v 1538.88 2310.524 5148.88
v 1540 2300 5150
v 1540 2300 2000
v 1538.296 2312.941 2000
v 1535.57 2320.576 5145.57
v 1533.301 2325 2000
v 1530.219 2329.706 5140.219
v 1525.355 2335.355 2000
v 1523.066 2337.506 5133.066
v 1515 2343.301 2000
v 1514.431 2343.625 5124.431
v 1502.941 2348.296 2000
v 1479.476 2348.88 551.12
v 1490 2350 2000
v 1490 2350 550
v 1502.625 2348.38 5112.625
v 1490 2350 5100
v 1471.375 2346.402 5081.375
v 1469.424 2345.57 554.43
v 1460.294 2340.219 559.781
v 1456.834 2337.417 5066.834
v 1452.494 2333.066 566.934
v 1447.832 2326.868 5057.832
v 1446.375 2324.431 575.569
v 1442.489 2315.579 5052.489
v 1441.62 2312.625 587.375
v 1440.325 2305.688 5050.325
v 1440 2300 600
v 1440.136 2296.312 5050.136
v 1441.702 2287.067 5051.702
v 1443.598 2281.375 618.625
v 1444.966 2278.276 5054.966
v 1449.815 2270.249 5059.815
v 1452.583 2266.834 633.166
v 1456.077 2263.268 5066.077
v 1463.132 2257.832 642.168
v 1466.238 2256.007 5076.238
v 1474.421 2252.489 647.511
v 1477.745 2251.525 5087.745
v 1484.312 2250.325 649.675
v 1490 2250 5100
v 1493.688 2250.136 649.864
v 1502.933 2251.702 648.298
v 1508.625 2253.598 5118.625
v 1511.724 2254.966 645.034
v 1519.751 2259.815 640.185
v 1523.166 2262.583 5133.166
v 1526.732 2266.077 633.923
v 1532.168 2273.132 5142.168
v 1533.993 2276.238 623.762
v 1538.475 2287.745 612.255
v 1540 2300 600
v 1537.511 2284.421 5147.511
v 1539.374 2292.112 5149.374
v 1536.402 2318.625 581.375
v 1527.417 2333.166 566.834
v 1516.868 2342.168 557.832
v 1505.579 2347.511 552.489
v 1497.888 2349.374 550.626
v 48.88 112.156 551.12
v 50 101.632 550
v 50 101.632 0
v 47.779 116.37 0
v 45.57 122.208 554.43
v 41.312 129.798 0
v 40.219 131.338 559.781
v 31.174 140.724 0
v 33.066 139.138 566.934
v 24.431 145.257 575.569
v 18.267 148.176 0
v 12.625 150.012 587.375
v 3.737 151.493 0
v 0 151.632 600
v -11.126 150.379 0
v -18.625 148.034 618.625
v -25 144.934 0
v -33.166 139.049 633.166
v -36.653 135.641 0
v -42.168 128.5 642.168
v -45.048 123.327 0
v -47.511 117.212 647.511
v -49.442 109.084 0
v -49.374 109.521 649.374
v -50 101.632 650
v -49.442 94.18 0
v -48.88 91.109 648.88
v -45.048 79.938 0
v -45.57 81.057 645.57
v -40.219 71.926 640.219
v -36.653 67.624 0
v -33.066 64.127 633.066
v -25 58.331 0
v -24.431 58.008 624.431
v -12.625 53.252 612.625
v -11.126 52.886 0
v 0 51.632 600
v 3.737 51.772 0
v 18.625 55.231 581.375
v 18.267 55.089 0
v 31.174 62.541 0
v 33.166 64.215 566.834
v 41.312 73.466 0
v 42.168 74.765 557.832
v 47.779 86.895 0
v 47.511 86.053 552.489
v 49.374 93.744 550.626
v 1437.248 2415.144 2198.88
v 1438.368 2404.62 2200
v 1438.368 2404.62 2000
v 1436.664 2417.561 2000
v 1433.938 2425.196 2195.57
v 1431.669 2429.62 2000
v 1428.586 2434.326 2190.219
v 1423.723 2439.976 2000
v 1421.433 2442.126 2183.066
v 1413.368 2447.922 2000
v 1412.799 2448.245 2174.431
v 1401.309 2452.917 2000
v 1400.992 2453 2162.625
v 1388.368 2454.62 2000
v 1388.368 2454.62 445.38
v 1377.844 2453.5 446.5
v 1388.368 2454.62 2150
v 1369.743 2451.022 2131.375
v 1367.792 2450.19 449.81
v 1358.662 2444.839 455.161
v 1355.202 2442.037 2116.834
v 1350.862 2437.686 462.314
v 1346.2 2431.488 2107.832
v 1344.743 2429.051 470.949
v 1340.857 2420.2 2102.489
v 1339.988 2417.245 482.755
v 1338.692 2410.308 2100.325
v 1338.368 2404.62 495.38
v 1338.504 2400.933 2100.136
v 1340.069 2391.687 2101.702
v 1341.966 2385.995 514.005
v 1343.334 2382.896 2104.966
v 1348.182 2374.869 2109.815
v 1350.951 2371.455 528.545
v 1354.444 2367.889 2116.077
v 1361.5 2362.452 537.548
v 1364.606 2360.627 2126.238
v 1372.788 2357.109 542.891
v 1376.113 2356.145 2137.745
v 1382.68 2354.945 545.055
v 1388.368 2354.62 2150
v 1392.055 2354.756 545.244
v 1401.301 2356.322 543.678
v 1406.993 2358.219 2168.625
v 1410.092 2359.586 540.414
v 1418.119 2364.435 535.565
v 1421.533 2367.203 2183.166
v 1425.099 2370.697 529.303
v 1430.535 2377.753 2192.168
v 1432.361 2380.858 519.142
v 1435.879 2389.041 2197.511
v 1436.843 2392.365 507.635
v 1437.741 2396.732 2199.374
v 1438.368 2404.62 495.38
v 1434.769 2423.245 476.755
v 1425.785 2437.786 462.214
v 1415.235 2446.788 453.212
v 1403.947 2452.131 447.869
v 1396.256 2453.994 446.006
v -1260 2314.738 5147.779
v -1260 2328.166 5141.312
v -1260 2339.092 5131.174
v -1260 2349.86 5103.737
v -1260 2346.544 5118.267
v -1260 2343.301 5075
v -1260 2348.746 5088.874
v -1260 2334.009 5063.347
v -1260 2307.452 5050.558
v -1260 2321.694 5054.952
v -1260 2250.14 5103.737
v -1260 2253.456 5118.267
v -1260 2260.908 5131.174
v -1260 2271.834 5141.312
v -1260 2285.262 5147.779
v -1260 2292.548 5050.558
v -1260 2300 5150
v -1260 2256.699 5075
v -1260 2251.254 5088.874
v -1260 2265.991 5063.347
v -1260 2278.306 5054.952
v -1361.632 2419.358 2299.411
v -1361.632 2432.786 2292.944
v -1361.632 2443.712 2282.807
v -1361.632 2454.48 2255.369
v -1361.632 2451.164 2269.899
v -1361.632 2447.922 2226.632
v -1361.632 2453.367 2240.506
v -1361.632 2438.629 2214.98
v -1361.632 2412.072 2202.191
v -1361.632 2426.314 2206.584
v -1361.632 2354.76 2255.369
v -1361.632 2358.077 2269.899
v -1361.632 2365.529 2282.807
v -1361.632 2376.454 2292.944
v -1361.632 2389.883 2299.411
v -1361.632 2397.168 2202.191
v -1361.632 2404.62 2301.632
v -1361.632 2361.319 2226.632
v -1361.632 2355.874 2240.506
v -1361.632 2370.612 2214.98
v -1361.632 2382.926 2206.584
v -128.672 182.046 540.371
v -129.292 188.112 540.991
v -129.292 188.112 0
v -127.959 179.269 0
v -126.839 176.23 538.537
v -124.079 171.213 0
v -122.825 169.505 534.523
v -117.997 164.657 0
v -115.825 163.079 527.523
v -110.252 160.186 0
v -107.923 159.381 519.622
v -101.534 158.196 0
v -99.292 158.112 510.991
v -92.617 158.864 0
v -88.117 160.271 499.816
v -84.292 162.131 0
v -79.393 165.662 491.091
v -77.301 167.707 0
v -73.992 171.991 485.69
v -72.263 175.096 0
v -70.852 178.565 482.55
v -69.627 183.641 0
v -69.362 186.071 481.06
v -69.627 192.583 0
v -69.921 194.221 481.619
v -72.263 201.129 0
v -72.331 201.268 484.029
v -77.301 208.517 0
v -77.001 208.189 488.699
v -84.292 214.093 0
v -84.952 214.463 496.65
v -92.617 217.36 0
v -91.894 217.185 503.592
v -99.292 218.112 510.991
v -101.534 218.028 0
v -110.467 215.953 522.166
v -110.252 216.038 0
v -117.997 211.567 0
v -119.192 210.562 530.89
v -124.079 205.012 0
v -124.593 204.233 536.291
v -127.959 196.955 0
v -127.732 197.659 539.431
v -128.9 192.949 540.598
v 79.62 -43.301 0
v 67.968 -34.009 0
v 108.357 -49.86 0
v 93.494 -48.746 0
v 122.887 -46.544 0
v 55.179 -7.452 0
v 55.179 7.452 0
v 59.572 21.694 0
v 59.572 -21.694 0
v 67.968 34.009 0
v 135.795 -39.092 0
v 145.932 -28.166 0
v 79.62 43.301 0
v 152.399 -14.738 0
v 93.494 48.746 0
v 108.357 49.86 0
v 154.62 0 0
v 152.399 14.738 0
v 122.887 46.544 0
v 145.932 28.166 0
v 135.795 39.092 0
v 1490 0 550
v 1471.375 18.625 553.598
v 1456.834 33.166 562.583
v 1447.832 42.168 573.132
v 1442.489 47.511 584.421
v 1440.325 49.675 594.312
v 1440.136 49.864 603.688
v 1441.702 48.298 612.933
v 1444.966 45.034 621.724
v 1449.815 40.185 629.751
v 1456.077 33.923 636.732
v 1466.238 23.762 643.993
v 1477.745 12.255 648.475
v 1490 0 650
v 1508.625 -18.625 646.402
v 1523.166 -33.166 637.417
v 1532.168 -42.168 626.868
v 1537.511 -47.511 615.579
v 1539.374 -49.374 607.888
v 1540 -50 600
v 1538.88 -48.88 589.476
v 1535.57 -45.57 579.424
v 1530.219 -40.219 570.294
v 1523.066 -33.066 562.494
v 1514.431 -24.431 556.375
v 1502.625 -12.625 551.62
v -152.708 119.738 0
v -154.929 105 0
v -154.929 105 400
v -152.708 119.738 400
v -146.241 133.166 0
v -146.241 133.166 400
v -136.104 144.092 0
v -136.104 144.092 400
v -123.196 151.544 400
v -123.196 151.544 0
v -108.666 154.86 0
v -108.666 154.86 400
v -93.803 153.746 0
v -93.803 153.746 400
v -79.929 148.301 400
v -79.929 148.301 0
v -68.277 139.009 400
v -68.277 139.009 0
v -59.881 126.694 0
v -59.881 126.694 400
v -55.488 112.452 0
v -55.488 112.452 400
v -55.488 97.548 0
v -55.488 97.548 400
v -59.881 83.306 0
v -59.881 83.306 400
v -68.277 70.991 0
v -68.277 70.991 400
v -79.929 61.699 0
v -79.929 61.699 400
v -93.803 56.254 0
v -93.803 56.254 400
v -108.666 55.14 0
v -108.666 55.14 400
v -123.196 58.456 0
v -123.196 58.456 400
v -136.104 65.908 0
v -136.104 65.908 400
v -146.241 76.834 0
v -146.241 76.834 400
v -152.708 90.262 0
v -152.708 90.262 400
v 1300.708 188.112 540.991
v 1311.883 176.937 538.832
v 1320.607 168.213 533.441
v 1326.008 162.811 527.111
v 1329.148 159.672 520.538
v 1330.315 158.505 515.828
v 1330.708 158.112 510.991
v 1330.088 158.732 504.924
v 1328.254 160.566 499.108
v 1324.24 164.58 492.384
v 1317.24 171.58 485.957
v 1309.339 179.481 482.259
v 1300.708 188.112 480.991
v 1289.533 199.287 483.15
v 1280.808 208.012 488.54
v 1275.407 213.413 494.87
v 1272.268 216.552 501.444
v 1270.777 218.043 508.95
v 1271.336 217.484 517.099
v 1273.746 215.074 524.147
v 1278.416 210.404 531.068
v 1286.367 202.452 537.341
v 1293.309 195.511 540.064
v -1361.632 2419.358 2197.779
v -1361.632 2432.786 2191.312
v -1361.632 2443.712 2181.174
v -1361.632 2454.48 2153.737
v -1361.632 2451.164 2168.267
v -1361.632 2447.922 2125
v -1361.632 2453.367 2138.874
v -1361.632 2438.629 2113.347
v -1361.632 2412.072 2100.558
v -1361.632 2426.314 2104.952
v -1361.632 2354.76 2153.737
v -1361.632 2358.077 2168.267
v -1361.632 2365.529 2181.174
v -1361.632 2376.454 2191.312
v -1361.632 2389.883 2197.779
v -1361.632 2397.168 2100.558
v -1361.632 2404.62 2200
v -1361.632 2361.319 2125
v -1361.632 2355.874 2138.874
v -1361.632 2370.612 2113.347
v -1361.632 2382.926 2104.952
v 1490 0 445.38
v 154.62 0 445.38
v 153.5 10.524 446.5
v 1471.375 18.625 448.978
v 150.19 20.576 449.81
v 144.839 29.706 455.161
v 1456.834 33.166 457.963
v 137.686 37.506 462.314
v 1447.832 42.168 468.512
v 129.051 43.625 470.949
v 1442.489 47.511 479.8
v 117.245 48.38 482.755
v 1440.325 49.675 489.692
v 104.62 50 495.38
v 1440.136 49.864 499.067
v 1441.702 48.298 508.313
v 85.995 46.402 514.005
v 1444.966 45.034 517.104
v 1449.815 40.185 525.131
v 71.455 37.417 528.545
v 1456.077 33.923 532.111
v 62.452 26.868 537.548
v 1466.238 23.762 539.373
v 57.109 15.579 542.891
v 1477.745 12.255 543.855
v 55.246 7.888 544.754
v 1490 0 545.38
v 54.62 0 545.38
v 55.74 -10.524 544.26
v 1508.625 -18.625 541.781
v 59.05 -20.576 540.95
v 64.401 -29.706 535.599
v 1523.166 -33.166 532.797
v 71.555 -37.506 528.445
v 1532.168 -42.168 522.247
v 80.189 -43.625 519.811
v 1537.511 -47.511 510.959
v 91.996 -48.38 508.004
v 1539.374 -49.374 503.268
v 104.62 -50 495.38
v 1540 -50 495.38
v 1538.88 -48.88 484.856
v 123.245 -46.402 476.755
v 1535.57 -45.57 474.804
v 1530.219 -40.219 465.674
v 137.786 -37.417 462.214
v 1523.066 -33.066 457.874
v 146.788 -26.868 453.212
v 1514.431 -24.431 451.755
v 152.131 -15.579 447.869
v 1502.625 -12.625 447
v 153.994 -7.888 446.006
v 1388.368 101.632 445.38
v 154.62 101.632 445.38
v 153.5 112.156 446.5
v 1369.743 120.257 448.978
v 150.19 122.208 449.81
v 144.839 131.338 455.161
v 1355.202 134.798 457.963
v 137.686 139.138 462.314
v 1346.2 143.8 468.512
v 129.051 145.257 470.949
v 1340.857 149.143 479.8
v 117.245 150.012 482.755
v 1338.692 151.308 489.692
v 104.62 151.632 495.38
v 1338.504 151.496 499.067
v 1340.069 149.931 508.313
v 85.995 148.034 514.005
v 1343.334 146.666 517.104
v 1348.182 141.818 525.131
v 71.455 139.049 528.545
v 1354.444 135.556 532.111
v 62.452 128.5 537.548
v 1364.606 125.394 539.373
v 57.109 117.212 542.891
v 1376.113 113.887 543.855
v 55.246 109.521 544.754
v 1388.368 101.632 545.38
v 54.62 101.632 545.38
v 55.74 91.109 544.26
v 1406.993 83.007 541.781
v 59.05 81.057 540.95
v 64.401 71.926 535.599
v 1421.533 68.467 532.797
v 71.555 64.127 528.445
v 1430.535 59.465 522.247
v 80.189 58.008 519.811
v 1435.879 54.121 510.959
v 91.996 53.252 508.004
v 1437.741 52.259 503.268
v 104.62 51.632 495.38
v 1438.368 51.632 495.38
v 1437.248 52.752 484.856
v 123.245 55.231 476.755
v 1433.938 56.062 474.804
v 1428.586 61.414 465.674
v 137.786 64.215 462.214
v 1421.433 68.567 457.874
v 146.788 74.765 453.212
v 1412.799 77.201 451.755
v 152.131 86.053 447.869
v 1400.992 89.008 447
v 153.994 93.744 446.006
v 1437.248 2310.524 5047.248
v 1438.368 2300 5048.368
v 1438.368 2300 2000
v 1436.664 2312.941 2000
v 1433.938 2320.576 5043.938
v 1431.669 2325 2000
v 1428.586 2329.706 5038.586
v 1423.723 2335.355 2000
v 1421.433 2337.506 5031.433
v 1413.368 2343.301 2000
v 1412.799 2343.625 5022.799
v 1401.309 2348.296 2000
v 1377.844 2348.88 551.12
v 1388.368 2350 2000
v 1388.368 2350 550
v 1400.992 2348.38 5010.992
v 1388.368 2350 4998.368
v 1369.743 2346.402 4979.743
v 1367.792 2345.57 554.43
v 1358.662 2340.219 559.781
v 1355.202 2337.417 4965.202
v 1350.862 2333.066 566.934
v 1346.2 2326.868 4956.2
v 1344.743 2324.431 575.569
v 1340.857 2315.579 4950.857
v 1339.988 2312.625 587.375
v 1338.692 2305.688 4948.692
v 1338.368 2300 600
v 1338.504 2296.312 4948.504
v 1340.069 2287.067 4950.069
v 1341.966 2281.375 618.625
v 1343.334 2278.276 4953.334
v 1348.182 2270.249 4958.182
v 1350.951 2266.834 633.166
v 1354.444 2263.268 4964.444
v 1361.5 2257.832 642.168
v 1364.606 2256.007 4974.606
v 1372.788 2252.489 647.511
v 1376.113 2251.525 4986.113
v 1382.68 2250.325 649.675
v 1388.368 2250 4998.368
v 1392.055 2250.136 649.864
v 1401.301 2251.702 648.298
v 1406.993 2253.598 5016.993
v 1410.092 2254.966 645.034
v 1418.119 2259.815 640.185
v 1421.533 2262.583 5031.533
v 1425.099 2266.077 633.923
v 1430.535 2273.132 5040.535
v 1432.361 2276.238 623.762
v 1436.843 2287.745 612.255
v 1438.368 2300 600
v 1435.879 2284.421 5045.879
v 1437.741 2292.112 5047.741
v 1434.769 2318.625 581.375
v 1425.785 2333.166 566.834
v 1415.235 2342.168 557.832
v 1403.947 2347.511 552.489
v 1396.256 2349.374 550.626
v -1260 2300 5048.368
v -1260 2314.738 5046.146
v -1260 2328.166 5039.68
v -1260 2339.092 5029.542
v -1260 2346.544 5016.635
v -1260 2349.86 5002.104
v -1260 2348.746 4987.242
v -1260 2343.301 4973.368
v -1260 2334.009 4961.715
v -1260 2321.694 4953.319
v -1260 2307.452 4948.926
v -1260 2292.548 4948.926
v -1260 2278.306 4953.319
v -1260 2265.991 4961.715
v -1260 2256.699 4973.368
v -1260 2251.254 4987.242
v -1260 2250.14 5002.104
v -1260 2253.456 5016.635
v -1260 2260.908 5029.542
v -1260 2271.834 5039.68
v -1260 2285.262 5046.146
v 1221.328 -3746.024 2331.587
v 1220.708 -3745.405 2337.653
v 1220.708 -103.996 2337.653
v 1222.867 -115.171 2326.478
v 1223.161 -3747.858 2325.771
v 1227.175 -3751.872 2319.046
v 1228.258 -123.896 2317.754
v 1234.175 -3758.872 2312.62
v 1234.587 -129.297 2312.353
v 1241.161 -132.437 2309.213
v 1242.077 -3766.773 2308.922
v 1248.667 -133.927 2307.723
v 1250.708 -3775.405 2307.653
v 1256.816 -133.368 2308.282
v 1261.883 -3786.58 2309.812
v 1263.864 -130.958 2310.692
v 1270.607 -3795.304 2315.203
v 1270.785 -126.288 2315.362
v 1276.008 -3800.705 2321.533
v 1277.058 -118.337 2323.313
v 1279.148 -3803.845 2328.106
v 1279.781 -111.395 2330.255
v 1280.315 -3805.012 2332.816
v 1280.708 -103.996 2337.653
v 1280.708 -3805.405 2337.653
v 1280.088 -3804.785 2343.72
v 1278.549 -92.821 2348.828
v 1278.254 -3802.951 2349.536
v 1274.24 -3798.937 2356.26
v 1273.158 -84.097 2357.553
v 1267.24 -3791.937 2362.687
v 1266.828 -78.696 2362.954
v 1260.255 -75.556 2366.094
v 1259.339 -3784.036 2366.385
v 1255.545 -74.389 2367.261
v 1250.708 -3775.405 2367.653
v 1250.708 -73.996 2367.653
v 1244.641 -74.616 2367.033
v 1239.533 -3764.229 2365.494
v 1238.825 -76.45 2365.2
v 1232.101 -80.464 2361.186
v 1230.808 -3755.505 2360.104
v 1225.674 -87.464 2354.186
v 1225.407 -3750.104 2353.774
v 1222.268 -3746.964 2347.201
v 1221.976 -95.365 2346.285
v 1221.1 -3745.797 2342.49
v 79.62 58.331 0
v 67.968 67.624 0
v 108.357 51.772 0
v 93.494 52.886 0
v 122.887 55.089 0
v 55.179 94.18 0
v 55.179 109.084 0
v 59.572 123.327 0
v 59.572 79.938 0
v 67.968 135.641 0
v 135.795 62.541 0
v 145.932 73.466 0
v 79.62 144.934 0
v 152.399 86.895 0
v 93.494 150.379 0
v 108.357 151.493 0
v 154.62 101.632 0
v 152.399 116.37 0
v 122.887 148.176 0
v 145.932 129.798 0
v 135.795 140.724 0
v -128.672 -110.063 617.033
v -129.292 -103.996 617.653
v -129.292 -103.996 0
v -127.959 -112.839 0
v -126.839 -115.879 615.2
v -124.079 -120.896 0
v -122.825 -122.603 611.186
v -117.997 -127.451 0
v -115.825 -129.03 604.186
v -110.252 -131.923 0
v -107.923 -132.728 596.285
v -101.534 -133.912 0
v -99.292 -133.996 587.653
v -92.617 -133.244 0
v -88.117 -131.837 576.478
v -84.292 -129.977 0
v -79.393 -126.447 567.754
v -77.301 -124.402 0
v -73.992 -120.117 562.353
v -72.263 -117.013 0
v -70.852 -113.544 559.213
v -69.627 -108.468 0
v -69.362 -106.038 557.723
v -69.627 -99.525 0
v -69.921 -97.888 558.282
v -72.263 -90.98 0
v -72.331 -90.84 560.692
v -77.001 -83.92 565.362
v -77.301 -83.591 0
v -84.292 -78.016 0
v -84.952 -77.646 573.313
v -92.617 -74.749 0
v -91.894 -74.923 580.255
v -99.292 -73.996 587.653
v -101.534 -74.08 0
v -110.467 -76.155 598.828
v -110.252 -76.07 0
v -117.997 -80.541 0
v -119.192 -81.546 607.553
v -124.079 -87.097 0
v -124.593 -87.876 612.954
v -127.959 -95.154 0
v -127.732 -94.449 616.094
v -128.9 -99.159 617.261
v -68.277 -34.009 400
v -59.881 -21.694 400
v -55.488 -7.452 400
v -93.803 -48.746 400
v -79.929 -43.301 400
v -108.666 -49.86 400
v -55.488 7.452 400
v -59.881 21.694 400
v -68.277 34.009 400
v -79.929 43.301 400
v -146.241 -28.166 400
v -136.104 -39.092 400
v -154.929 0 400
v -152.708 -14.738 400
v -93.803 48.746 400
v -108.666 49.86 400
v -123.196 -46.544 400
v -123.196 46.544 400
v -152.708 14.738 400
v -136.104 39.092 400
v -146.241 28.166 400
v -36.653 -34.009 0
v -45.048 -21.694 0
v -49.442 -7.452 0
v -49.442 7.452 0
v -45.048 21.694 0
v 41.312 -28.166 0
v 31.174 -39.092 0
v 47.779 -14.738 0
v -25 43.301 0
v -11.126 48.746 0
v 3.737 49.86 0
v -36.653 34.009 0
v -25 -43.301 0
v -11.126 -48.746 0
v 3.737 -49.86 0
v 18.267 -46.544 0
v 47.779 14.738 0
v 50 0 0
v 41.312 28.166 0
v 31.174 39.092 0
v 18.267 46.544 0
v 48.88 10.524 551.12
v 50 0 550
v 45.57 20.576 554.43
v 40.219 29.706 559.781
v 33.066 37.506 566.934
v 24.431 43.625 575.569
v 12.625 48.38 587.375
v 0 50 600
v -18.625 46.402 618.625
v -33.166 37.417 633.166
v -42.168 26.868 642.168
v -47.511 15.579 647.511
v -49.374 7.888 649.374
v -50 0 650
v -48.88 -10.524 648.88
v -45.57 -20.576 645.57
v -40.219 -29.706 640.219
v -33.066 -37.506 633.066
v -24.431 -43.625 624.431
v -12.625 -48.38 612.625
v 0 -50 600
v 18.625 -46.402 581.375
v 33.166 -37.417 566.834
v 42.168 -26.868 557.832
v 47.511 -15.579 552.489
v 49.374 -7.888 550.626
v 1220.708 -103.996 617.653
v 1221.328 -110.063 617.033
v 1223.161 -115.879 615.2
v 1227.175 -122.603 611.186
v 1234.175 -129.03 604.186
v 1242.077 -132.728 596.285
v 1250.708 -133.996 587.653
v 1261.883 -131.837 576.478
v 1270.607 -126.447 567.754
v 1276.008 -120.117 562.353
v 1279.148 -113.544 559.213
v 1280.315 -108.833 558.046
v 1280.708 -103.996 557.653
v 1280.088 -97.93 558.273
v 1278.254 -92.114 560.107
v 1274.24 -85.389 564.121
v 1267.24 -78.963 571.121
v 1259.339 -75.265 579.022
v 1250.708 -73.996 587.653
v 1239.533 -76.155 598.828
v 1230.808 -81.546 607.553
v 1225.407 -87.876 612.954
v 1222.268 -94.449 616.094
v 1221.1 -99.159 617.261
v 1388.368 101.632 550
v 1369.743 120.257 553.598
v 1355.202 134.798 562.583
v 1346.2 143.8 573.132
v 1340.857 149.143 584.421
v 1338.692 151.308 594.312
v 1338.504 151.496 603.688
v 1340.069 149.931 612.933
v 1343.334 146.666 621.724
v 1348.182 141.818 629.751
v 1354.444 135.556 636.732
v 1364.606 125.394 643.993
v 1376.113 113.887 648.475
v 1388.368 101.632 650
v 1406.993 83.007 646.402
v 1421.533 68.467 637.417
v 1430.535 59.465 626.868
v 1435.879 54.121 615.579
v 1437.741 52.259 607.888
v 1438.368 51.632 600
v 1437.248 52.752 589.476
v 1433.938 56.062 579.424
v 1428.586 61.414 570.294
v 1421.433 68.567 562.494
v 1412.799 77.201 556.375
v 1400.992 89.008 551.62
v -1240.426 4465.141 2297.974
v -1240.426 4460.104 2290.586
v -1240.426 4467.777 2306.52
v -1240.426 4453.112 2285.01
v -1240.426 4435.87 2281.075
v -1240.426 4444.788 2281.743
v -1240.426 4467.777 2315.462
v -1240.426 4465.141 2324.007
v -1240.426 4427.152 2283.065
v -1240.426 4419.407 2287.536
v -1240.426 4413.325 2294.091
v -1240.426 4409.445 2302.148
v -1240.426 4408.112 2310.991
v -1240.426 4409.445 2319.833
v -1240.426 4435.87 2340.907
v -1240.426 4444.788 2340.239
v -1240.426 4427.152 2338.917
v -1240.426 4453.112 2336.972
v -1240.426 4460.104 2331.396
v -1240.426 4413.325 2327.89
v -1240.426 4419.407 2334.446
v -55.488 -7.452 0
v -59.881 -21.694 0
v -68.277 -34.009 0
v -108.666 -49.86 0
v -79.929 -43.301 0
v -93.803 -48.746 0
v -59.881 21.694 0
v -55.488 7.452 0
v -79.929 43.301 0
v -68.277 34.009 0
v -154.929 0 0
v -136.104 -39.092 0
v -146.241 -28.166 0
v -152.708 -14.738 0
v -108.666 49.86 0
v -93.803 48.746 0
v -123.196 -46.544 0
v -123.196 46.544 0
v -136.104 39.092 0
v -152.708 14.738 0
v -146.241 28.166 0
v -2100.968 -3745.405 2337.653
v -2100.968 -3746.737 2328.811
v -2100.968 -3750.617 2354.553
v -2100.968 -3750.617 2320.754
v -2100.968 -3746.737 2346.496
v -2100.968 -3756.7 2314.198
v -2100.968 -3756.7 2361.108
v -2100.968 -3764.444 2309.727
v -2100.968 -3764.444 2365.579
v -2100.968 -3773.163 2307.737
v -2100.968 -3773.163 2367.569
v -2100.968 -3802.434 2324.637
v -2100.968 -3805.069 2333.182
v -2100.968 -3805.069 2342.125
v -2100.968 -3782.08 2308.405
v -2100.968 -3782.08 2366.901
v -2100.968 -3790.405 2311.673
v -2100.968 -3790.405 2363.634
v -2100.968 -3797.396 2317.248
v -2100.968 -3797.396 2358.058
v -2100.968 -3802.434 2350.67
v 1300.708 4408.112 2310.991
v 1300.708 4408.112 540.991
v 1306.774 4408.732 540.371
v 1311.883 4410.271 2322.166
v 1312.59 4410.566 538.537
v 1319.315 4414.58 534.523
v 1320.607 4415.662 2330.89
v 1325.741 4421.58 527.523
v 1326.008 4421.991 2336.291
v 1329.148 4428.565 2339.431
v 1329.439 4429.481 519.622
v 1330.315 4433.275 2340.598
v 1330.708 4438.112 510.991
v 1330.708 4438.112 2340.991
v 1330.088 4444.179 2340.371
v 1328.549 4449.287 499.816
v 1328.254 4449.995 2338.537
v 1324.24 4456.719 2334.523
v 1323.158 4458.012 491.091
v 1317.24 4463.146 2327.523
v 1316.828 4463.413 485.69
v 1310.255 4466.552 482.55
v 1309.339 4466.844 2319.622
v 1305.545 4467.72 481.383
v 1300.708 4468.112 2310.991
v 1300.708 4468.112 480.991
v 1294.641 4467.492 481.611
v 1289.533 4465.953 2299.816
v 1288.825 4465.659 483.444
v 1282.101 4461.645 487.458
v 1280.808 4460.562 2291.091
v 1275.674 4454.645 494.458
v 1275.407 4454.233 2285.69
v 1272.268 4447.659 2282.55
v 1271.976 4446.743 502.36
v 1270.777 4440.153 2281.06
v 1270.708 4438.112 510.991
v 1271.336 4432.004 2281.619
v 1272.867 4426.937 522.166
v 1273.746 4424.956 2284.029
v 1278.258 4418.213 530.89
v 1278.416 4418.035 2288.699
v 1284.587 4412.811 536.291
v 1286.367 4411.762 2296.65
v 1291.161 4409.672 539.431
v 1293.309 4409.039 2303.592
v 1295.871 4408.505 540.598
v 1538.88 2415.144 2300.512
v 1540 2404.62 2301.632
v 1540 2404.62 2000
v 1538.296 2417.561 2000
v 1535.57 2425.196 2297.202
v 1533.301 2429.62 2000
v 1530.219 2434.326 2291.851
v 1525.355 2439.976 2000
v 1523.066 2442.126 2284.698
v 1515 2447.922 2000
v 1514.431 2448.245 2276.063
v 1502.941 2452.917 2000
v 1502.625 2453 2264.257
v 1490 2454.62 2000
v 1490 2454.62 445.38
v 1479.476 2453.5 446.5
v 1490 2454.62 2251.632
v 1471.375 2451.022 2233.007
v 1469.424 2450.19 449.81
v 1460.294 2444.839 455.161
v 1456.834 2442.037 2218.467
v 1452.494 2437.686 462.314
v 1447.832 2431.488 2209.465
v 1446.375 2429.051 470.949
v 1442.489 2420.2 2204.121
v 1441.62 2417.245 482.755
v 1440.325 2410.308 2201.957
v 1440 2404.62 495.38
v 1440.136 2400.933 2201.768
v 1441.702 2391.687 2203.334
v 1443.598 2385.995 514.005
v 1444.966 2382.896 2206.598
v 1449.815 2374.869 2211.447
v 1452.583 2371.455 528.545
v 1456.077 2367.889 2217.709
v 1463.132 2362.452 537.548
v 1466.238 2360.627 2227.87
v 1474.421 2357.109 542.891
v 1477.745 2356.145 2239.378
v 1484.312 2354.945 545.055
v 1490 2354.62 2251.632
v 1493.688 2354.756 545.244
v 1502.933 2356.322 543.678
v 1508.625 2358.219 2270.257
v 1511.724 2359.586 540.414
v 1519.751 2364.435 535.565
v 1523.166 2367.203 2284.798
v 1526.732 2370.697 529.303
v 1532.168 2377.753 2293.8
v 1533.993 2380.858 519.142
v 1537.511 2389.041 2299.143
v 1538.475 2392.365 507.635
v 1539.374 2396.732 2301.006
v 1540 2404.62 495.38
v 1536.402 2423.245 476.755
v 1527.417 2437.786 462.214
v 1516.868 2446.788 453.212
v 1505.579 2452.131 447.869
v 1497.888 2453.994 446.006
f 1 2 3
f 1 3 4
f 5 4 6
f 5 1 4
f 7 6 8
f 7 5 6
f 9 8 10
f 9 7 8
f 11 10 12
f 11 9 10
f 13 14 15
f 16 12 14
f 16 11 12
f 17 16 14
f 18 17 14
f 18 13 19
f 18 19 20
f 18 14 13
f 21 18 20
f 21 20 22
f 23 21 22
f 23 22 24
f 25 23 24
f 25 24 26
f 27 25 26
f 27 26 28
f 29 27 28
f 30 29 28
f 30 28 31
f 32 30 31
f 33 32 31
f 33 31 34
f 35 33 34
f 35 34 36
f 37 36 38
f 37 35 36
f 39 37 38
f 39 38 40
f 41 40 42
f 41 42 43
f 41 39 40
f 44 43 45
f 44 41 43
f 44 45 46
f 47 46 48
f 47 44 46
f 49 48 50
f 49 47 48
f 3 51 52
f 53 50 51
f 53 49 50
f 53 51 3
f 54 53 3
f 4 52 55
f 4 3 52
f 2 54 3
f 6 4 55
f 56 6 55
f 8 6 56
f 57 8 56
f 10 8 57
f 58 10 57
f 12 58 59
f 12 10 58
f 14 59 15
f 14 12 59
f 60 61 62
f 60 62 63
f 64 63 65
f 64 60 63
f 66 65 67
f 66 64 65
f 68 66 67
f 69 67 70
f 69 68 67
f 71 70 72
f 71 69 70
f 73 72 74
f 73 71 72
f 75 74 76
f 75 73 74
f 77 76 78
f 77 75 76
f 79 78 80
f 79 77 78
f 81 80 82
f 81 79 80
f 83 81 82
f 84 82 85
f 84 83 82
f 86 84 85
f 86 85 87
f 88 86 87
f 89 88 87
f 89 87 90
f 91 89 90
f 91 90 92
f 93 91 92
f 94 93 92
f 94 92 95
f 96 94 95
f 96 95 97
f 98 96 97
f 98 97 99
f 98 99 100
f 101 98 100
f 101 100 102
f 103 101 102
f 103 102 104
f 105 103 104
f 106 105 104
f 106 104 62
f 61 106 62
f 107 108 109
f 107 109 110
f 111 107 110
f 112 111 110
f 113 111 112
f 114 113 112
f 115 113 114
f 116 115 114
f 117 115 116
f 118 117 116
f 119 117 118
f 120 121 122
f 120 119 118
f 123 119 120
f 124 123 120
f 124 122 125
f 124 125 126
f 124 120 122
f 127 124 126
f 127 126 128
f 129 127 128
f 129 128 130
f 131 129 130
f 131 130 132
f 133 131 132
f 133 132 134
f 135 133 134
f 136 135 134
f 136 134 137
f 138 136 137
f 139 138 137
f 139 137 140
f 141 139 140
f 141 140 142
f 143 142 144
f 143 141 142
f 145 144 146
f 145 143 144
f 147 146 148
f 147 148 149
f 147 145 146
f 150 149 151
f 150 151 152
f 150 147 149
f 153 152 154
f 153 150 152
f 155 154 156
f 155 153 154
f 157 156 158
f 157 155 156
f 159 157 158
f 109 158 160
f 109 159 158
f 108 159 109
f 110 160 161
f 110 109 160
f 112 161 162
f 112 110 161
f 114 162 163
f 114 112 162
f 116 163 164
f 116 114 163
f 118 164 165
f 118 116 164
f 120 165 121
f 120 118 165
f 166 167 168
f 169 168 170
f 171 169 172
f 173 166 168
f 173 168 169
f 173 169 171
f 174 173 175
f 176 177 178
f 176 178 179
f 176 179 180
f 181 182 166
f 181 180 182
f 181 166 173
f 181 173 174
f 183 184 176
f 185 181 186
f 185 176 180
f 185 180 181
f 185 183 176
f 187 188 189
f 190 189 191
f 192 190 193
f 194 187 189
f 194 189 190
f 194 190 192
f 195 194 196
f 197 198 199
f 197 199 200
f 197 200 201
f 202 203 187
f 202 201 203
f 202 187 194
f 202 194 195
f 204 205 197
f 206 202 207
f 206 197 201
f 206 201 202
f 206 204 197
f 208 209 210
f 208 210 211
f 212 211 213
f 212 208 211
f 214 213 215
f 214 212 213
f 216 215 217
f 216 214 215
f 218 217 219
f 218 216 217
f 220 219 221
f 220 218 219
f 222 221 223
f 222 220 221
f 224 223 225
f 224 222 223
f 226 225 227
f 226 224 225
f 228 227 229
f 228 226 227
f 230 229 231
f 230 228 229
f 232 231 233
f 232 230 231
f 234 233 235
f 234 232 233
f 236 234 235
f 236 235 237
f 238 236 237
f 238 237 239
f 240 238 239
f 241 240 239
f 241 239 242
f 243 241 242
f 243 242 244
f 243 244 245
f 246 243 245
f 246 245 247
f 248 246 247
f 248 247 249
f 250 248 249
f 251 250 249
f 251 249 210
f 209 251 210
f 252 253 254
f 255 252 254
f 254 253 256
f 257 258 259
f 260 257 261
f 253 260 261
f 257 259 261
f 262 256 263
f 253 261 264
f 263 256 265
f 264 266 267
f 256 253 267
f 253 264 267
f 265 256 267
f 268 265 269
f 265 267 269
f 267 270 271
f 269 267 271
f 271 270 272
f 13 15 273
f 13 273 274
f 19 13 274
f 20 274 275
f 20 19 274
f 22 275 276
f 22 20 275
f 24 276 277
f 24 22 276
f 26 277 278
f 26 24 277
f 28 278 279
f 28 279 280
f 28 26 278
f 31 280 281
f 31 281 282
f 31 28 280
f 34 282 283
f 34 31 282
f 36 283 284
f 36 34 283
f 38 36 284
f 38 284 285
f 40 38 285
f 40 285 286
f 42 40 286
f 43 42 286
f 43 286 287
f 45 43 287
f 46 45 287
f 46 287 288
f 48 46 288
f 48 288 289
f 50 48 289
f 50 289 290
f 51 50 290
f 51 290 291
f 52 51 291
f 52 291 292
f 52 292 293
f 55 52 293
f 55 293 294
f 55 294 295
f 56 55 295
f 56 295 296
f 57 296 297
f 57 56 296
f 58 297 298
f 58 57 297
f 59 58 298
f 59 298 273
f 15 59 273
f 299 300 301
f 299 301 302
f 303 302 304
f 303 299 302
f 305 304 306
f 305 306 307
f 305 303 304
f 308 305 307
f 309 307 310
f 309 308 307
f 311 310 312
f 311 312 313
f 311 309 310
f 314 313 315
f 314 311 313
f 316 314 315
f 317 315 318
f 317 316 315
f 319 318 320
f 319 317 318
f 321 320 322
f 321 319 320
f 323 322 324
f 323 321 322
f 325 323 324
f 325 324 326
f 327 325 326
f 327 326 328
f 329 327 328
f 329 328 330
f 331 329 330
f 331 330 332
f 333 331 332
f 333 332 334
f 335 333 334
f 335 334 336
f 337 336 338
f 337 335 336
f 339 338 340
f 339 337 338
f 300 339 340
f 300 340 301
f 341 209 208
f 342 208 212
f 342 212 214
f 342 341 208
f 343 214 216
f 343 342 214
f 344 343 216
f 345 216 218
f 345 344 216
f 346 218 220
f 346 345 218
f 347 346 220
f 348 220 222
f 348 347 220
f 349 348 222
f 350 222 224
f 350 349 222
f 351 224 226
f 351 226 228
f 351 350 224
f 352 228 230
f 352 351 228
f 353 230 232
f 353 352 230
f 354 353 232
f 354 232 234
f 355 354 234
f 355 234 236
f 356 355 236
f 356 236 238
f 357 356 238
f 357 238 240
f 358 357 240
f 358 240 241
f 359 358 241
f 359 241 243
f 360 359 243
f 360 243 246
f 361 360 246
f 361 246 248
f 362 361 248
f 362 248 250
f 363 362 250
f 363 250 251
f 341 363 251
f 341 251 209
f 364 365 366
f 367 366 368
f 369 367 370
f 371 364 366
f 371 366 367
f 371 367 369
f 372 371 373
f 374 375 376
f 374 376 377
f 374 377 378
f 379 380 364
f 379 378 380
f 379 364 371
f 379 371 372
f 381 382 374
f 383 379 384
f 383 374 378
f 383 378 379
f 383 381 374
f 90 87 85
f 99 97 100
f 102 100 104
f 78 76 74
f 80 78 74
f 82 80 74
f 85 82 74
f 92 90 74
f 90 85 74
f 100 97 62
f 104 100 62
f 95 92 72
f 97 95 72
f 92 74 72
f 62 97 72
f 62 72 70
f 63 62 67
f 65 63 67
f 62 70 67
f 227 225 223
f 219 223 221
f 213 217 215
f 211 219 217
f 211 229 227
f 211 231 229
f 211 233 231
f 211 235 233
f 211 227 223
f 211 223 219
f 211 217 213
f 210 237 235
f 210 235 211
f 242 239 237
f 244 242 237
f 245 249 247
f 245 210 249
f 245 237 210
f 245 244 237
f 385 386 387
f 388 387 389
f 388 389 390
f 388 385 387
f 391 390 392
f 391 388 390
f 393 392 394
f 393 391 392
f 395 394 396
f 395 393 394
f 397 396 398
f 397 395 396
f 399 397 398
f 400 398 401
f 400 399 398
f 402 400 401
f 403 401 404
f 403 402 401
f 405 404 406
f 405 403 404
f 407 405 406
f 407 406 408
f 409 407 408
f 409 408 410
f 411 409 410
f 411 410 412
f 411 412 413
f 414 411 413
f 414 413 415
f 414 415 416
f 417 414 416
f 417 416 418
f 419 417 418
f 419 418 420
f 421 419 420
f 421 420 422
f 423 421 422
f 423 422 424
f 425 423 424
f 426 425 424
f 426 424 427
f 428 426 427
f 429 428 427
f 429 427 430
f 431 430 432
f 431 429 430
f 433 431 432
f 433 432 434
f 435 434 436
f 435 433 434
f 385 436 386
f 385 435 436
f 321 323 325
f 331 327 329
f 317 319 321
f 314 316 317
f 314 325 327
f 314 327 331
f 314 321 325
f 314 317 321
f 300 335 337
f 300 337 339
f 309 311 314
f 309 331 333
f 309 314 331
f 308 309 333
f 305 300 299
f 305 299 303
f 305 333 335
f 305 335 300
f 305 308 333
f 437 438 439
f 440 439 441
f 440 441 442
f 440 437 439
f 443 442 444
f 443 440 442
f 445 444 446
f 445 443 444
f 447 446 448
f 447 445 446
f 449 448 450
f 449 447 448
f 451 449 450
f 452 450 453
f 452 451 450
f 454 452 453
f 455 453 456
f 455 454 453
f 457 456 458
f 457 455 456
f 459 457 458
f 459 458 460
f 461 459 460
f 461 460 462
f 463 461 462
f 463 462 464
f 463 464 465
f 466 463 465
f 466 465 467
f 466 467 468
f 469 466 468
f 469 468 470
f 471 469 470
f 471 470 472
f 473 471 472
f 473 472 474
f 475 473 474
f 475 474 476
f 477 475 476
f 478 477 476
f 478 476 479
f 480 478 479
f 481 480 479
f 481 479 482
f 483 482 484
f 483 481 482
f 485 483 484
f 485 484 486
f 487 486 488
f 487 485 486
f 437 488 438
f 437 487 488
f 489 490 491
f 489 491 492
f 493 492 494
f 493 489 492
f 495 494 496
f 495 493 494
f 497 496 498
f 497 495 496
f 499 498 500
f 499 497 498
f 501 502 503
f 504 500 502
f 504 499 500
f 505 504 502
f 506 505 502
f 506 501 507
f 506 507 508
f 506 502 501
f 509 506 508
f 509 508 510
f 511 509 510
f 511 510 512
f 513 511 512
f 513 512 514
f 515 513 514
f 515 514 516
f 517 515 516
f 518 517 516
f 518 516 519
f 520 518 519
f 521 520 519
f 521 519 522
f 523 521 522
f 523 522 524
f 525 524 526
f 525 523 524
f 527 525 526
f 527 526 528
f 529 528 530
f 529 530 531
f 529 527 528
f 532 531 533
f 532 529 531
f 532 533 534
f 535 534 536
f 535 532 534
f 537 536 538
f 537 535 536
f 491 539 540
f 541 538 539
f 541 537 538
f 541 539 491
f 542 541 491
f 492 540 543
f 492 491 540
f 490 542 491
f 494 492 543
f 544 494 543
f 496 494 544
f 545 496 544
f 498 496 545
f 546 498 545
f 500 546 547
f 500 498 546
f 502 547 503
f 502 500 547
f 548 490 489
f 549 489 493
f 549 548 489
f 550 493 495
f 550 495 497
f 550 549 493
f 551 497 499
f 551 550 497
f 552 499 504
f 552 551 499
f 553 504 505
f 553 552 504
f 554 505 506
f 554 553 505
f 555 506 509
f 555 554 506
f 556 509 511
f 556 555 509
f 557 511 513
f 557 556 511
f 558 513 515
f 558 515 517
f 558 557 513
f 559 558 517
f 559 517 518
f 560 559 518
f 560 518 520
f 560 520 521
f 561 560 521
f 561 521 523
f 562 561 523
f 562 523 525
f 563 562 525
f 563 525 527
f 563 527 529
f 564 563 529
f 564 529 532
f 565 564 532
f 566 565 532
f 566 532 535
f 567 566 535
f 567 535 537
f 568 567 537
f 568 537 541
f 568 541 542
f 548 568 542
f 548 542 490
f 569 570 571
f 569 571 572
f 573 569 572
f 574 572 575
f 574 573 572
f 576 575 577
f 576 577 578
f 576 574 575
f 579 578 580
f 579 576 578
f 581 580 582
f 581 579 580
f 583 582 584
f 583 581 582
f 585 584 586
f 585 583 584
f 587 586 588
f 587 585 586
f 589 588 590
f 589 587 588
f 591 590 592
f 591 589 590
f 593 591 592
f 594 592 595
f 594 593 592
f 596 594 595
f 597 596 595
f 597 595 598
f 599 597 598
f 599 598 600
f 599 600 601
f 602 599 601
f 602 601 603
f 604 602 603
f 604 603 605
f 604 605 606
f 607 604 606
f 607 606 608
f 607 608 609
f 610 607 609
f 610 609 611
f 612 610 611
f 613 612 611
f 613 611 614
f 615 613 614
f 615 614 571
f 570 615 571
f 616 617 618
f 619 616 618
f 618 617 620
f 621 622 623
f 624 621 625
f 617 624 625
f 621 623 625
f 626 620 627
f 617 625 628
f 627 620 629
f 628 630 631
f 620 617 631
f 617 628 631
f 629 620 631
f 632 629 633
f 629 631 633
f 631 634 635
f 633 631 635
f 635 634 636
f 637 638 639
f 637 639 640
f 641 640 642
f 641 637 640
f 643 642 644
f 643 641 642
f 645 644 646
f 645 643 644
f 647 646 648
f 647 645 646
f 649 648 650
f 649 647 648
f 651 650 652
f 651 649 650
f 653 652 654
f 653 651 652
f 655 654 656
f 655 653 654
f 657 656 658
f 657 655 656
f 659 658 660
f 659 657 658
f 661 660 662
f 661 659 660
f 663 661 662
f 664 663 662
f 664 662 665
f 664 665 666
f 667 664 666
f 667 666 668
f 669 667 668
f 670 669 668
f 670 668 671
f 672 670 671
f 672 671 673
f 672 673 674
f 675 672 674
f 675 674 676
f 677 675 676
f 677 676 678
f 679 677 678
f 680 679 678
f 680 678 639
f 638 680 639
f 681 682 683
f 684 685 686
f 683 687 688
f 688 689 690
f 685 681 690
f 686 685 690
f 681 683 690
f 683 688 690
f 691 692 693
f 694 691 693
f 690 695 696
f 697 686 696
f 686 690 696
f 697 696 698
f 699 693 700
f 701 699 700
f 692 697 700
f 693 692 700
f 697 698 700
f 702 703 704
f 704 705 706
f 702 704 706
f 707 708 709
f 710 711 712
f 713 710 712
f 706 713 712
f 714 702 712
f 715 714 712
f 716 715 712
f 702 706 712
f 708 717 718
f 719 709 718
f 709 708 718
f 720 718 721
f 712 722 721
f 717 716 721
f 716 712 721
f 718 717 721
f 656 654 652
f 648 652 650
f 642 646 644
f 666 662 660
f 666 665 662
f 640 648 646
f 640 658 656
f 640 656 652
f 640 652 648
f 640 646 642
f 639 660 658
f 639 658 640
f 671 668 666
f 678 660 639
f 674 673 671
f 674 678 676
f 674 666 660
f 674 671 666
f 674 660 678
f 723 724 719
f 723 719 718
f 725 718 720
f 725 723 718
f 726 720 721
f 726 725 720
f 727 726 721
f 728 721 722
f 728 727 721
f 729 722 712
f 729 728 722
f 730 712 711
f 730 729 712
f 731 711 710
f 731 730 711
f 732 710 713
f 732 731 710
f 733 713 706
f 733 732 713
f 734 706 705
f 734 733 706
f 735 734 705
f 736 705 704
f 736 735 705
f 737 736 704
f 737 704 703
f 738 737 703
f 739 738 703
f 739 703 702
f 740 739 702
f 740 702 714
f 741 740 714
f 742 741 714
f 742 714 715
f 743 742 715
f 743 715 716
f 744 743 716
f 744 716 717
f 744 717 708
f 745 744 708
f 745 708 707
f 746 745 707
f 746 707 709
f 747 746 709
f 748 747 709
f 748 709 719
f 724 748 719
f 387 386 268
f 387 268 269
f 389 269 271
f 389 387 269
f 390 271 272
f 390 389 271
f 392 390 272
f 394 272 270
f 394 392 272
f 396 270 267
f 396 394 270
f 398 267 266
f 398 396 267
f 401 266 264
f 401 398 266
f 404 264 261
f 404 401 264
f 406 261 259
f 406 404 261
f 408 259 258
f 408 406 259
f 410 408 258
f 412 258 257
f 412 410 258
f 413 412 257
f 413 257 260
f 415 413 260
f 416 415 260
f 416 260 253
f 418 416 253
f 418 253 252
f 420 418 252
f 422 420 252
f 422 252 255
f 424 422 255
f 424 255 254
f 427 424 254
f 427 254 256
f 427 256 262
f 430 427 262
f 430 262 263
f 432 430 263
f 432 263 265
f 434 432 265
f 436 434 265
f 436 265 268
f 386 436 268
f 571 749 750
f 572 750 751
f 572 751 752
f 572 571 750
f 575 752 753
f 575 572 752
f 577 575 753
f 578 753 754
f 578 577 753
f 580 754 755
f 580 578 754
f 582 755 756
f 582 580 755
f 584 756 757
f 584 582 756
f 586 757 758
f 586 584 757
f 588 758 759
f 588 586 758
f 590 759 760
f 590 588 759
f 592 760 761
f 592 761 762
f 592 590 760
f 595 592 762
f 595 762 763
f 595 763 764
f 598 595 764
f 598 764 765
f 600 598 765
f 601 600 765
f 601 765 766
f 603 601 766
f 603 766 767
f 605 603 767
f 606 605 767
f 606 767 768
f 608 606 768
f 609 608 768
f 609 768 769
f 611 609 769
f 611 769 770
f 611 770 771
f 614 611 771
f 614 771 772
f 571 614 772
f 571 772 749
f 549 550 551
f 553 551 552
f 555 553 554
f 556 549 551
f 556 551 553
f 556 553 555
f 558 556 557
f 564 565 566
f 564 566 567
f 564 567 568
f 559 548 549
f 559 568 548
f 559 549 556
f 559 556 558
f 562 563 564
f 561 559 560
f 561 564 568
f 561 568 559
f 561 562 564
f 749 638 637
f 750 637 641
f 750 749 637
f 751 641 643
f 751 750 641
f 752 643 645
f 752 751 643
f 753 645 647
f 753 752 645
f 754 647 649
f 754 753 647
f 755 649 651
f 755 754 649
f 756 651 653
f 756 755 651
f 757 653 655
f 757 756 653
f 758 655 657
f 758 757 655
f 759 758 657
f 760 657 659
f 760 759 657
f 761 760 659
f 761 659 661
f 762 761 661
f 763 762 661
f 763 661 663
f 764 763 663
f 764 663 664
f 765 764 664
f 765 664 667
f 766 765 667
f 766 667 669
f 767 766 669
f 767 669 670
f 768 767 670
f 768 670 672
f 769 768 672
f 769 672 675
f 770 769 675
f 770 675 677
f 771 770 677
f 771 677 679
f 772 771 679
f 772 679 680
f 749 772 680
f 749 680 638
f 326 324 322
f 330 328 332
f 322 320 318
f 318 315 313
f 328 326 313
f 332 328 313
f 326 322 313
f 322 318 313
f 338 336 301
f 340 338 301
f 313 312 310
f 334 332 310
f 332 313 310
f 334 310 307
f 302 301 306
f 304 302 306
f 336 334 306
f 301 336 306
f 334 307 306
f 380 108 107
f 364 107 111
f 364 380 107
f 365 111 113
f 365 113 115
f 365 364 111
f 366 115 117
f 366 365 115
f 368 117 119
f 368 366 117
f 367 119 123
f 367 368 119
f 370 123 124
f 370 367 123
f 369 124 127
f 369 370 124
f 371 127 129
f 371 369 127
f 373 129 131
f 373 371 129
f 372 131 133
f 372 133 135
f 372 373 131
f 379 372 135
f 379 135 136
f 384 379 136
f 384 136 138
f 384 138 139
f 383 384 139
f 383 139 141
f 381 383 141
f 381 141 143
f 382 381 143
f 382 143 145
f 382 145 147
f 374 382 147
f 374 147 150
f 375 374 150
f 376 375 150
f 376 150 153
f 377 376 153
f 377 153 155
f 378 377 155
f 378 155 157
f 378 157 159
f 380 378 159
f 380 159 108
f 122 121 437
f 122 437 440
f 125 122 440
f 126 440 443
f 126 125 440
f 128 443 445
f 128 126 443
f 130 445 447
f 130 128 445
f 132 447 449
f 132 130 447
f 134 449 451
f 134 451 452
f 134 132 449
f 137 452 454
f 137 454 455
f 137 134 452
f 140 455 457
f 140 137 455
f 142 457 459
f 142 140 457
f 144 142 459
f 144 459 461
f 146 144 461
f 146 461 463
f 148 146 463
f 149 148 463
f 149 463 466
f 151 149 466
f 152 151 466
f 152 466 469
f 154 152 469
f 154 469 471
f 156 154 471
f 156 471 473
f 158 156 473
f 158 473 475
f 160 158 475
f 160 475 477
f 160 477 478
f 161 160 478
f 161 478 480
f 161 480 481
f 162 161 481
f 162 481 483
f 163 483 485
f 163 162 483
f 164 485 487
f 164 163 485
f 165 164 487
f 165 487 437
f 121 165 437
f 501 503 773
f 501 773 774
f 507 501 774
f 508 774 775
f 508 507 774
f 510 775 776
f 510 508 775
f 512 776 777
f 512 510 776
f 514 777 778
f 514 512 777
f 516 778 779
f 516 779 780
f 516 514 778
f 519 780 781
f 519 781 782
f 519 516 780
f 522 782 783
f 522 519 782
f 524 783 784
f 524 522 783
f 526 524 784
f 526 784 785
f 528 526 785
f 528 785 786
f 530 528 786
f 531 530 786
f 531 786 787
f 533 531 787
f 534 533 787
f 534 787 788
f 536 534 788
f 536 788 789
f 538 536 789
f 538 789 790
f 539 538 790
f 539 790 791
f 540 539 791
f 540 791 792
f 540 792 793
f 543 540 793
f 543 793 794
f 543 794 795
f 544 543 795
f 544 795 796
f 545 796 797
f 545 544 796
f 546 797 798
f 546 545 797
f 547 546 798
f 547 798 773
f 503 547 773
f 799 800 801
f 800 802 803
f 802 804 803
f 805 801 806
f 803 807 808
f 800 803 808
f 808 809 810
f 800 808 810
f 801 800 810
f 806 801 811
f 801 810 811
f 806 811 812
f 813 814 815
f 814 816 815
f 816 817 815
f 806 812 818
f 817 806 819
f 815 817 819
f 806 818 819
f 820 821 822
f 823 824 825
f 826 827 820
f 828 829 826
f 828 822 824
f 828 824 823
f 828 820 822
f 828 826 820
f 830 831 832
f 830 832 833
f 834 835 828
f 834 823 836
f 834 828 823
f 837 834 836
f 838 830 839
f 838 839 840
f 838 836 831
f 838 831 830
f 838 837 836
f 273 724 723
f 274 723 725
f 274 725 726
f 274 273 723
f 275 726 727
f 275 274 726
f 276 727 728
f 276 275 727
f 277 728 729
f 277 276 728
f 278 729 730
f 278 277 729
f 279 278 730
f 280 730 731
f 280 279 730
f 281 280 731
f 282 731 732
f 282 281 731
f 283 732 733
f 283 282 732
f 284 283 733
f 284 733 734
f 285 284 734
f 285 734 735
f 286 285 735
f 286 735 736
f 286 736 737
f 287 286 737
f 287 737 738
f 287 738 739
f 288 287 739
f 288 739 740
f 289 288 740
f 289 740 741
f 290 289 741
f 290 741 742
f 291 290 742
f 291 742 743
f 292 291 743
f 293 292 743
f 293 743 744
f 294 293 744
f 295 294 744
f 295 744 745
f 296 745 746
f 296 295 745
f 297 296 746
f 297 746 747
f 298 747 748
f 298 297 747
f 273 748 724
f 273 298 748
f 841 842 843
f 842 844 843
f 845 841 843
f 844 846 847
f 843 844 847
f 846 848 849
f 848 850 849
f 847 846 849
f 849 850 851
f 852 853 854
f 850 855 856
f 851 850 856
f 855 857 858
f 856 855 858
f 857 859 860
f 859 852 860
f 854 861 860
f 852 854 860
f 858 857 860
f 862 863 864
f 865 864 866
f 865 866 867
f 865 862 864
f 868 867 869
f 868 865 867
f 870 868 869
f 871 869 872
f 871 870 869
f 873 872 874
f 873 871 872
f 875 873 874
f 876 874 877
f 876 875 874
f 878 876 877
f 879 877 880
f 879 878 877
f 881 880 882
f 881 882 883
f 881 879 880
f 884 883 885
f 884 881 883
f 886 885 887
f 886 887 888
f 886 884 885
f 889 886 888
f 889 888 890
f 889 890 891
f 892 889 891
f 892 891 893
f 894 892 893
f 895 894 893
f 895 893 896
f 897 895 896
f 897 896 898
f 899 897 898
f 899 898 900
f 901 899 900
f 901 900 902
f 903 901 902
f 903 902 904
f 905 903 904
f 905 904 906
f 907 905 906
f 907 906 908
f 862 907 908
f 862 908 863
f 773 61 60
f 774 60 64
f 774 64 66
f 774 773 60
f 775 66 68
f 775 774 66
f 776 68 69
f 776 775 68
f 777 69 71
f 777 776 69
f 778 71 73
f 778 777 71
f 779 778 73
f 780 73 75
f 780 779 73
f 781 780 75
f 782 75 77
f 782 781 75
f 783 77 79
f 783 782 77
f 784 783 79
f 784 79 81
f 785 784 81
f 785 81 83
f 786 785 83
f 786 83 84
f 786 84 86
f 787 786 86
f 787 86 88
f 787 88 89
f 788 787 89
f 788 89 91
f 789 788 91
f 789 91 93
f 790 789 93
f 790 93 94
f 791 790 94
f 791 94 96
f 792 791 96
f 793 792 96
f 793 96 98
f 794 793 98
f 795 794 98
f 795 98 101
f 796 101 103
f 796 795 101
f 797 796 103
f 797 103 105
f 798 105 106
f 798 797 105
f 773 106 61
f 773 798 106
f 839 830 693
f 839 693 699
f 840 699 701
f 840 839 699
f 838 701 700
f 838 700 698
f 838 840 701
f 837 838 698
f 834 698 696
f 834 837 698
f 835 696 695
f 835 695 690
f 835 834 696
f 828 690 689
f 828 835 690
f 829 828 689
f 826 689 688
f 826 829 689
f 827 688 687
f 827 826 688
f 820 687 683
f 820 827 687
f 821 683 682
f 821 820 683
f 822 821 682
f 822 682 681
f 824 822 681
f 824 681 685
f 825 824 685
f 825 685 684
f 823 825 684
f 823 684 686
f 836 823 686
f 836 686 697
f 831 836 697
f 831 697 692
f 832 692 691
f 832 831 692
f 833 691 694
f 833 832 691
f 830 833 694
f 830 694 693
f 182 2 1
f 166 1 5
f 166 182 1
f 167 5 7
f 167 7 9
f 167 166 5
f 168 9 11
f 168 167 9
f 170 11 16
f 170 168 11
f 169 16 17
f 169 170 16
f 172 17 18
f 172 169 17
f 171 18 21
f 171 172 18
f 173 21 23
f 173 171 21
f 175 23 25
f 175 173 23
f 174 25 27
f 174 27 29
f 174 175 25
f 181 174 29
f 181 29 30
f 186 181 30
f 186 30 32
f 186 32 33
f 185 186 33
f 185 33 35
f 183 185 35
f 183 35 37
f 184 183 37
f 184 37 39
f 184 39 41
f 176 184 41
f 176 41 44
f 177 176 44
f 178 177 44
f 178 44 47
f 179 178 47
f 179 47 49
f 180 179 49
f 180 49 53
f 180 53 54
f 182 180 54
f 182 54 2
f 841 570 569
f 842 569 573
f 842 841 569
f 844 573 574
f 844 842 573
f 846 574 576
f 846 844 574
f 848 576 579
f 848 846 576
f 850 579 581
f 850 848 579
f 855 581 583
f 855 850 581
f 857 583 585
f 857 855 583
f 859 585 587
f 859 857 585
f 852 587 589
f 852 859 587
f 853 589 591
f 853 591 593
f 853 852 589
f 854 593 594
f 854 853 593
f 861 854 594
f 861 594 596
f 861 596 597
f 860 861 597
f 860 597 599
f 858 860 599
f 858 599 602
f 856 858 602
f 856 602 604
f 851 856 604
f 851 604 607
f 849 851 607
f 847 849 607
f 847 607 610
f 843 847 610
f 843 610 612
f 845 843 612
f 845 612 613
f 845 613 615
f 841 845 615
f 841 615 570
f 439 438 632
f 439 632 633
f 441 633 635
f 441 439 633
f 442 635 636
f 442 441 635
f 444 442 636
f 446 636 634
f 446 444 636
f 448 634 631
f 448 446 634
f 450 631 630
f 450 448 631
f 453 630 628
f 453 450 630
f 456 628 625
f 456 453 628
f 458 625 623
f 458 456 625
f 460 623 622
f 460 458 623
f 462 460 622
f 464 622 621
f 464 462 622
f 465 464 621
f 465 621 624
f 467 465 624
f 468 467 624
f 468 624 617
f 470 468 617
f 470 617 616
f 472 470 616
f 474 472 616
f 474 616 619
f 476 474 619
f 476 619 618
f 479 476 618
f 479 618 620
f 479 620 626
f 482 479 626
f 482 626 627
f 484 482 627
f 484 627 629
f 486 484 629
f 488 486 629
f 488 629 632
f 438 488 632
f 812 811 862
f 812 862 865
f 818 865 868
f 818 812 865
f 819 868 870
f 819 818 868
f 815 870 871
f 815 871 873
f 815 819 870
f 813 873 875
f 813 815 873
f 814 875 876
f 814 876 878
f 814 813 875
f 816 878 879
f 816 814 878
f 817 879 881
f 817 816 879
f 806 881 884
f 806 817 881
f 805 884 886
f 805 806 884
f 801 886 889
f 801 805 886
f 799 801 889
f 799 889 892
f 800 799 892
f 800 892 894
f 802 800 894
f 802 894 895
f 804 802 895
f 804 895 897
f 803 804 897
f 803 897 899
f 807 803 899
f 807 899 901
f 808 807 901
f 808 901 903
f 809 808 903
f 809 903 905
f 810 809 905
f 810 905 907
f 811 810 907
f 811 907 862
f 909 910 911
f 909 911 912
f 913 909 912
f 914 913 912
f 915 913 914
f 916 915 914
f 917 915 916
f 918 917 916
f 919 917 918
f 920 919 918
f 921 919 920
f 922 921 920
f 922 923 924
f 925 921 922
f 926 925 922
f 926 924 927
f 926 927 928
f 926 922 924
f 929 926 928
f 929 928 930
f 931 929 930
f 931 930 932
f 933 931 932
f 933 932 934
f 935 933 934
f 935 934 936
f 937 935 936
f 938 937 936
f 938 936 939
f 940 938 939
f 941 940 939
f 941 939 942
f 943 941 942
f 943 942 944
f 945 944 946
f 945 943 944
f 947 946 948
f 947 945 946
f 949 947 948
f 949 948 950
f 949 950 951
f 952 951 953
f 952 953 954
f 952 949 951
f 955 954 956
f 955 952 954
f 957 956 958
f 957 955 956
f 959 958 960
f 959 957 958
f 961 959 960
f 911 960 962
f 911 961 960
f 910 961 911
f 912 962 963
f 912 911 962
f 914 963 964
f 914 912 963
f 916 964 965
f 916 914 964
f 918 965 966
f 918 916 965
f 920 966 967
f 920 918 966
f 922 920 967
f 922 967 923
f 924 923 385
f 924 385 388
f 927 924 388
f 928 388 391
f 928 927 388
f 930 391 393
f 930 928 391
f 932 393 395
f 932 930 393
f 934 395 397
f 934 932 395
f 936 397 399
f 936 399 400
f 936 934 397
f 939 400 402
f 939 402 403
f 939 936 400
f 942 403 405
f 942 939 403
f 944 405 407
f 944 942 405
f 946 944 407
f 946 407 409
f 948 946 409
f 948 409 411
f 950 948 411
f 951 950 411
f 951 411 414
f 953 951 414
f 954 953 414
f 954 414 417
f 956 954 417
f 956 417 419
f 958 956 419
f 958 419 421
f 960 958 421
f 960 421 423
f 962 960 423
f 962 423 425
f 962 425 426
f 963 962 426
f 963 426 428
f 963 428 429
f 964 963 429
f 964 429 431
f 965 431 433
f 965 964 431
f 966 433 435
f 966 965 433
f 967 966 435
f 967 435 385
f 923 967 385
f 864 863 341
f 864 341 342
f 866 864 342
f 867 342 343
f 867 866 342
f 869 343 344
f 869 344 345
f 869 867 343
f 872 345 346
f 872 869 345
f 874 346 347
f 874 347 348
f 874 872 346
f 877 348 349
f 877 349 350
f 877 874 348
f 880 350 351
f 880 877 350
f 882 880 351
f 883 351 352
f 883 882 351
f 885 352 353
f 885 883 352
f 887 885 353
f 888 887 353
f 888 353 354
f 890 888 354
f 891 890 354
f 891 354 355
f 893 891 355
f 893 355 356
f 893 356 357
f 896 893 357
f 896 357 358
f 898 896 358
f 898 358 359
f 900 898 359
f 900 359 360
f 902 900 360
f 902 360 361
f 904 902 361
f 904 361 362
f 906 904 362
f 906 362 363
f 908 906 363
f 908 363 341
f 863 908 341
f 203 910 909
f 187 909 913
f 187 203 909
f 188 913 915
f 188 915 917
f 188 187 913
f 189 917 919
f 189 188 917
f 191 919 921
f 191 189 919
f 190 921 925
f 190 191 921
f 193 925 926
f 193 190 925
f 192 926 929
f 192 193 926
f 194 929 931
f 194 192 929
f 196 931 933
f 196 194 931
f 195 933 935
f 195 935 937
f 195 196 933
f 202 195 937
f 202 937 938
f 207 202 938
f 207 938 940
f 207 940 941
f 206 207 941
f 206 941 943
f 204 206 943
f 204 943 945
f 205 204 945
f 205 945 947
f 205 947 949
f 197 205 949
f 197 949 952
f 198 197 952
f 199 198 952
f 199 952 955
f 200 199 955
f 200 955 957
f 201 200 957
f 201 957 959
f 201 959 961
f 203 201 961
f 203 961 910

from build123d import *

# Parameters (mm, degrees)
SKETCH1_R             = 50
SKETCH4_R             = 50
BOSS_EXTRUDE1_DEPTH   = 400
BOSS_EXTRUDE1_2_DEPTH = 400
SKETCH5_R             = 30
SKETCH7_R             = 30
SKETCH3_R             = 50
SKETCH2_R             = 50


with BuildPart() as part:
    # Sweep1: sweep along a curve in space
    with BuildLine() as sweep1_path:
        Line((0, 0, 0), (0, 0, 600))
        Line((0, 0, 600), (1490, 0, 600))
        Line((1490, 0, 600), (1490, 2300, 600))
        Line((1490, 2300, 600), (1490, 2300, 2000))
    # Sketch1 → Sweep1 (sweep)
    with BuildSketch(Plane.XY):
        Circle(SKETCH1_R)
        with Locations((104.6202598, 0)):
            Circle(SKETCH1_R)
        with Locations((104.6202598, 101.632314008)):
            Circle(SKETCH1_R)
        with Locations((0, 101.632314008)):
            Circle(SKETCH1_R)
    sweep(path=sweep1_path.line, transition=Transition.RIGHT)

    # Sweep9: sweep along a curve in space
    with BuildLine() as sweep9_path:
        Line((1490, 2300, 2000), (1490, 2300, 5100))
        Line((1490, 2300, 5100), (-1260, 2300, 5100))
    # Sketch3 → Sweep9 (sweep)
    with BuildSketch(Plane.XY.offset(2000)):
        with Locations((1490, 2300)):
            Circle(SKETCH3_R)
        with Locations((1388.367685992, 2300)):
            Circle(SKETCH3_R)
    sweep(path=sweep9_path.line, transition=Transition.RIGHT)

    # Sweep10: sweep along a curve in space
    with BuildLine() as sweep10_path:
        Line((1388.367685992, 2404.6202598, 2000), (1388.367685992, 2404.6202598, 2150))
        Line((1388.367685992, 2404.6202598, 2150), (-1361.632314008, 2404.6202598, 2150))
    # Sketch2 → Sweep10 (sweep)
    with BuildSketch(Plane.XY.offset(2000)):
        with Locations((1490, 2404.6202598)):
            Circle(SKETCH2_R)
        with Locations((1388.367685992, 2404.6202598)):
            Circle(SKETCH2_R)
    sweep(path=sweep10_path.line, transition=Transition.RIGHT)


with BuildPart() as body_2:
    # Sketch4 → Boss-Extrude1 (new body)
    with BuildSketch(Plane(origin=(0, 0, 0), x_dir=(-1, 0, 0), z_dir=(0, 0, -1))):
        with Locations((104.929398094, 0)):
            Circle(SKETCH4_R)
    extrude(amount=-BOSS_EXTRUDE1_DEPTH)


with BuildPart() as body_3:
    # Sketch4 → Boss-Extrude1 2 (new body)
    with BuildSketch(Plane(origin=(0, 0, 0), x_dir=(-1, 0, 0), z_dir=(0, 0, -1))):
        with Locations((104.929398094, 105)):
            Circle(SKETCH4_R)
    extrude(amount=-BOSS_EXTRUDE1_2_DEPTH)


with BuildPart() as body_4:
    # Sweep6: sweep along a curve in space
    with BuildLine() as sweep6_path:
        Line((-99.29220996, -103.996357315, 0), (-99.29220996, -103.996357315, 587.653269417))
        Line((-99.29220996, -103.996357315, 587.653269417), (1250.70779004, -103.996357315, 587.653269417))
        Line((1250.70779004, -103.996357315, 587.653269417), (1250.70779004, -103.996357315, 2337.653269417))
        Line((1250.70779004, -103.996357315, 2337.653269417), (1250.70779004, -3775.40455596, 2337.653269417))
        Line((1250.70779004, -3775.40455596, 2337.653269417), (-2100.967960552, -3775.40455596, 2337.653269417))
    # Sketch5 → Sweep6 (sweep)
    with BuildSketch(Plane(origin=(0, 0, 0), x_dir=(-1, 0, 0), z_dir=(0, 0, -1))):
        with Locations((99.29220996, -103.996357315)):
            Circle(SKETCH5_R)
    sweep(path=sweep6_path.line, transition=Transition.RIGHT)


with BuildPart() as body_5:
    # Sweep8: sweep along a curve in space
    with BuildLine() as sweep8_path:
        Line((-99.29220996, 188.112137483, 0), (-99.29220996, 188.112137483, 510.990772747))
        Line((-99.29220996, 188.112137483, 510.990772747), (1300.70779004, 188.112137483, 510.990772747))
        Line((1300.70779004, 188.112137483, 510.990772747), (1300.70779004, 4438.112137483, 510.990772747))
        Line((1300.70779004, 4438.112137483, 510.990772747), (1300.70779004, 4438.112137483, 2310.990772747))
        Line((1300.70779004, 4438.112137483, 2310.990772747), (-1240.426079734, 4438.112137483, 2310.990772747))
    # Sketch7 → Sweep8 (sweep)
    with BuildSketch(Plane(origin=(0, 0, 0), x_dir=(-1, 0, 0), z_dir=(0, 0, -1))):
        with Locations((99.29220996, 188.112137483)):
            Circle(SKETCH7_R)
    sweep(path=sweep8_path.line, transition=Transition.RIGHT)


solid = Compound([part.part, body_2.part, body_3.part, body_4.part, body_5.part])
